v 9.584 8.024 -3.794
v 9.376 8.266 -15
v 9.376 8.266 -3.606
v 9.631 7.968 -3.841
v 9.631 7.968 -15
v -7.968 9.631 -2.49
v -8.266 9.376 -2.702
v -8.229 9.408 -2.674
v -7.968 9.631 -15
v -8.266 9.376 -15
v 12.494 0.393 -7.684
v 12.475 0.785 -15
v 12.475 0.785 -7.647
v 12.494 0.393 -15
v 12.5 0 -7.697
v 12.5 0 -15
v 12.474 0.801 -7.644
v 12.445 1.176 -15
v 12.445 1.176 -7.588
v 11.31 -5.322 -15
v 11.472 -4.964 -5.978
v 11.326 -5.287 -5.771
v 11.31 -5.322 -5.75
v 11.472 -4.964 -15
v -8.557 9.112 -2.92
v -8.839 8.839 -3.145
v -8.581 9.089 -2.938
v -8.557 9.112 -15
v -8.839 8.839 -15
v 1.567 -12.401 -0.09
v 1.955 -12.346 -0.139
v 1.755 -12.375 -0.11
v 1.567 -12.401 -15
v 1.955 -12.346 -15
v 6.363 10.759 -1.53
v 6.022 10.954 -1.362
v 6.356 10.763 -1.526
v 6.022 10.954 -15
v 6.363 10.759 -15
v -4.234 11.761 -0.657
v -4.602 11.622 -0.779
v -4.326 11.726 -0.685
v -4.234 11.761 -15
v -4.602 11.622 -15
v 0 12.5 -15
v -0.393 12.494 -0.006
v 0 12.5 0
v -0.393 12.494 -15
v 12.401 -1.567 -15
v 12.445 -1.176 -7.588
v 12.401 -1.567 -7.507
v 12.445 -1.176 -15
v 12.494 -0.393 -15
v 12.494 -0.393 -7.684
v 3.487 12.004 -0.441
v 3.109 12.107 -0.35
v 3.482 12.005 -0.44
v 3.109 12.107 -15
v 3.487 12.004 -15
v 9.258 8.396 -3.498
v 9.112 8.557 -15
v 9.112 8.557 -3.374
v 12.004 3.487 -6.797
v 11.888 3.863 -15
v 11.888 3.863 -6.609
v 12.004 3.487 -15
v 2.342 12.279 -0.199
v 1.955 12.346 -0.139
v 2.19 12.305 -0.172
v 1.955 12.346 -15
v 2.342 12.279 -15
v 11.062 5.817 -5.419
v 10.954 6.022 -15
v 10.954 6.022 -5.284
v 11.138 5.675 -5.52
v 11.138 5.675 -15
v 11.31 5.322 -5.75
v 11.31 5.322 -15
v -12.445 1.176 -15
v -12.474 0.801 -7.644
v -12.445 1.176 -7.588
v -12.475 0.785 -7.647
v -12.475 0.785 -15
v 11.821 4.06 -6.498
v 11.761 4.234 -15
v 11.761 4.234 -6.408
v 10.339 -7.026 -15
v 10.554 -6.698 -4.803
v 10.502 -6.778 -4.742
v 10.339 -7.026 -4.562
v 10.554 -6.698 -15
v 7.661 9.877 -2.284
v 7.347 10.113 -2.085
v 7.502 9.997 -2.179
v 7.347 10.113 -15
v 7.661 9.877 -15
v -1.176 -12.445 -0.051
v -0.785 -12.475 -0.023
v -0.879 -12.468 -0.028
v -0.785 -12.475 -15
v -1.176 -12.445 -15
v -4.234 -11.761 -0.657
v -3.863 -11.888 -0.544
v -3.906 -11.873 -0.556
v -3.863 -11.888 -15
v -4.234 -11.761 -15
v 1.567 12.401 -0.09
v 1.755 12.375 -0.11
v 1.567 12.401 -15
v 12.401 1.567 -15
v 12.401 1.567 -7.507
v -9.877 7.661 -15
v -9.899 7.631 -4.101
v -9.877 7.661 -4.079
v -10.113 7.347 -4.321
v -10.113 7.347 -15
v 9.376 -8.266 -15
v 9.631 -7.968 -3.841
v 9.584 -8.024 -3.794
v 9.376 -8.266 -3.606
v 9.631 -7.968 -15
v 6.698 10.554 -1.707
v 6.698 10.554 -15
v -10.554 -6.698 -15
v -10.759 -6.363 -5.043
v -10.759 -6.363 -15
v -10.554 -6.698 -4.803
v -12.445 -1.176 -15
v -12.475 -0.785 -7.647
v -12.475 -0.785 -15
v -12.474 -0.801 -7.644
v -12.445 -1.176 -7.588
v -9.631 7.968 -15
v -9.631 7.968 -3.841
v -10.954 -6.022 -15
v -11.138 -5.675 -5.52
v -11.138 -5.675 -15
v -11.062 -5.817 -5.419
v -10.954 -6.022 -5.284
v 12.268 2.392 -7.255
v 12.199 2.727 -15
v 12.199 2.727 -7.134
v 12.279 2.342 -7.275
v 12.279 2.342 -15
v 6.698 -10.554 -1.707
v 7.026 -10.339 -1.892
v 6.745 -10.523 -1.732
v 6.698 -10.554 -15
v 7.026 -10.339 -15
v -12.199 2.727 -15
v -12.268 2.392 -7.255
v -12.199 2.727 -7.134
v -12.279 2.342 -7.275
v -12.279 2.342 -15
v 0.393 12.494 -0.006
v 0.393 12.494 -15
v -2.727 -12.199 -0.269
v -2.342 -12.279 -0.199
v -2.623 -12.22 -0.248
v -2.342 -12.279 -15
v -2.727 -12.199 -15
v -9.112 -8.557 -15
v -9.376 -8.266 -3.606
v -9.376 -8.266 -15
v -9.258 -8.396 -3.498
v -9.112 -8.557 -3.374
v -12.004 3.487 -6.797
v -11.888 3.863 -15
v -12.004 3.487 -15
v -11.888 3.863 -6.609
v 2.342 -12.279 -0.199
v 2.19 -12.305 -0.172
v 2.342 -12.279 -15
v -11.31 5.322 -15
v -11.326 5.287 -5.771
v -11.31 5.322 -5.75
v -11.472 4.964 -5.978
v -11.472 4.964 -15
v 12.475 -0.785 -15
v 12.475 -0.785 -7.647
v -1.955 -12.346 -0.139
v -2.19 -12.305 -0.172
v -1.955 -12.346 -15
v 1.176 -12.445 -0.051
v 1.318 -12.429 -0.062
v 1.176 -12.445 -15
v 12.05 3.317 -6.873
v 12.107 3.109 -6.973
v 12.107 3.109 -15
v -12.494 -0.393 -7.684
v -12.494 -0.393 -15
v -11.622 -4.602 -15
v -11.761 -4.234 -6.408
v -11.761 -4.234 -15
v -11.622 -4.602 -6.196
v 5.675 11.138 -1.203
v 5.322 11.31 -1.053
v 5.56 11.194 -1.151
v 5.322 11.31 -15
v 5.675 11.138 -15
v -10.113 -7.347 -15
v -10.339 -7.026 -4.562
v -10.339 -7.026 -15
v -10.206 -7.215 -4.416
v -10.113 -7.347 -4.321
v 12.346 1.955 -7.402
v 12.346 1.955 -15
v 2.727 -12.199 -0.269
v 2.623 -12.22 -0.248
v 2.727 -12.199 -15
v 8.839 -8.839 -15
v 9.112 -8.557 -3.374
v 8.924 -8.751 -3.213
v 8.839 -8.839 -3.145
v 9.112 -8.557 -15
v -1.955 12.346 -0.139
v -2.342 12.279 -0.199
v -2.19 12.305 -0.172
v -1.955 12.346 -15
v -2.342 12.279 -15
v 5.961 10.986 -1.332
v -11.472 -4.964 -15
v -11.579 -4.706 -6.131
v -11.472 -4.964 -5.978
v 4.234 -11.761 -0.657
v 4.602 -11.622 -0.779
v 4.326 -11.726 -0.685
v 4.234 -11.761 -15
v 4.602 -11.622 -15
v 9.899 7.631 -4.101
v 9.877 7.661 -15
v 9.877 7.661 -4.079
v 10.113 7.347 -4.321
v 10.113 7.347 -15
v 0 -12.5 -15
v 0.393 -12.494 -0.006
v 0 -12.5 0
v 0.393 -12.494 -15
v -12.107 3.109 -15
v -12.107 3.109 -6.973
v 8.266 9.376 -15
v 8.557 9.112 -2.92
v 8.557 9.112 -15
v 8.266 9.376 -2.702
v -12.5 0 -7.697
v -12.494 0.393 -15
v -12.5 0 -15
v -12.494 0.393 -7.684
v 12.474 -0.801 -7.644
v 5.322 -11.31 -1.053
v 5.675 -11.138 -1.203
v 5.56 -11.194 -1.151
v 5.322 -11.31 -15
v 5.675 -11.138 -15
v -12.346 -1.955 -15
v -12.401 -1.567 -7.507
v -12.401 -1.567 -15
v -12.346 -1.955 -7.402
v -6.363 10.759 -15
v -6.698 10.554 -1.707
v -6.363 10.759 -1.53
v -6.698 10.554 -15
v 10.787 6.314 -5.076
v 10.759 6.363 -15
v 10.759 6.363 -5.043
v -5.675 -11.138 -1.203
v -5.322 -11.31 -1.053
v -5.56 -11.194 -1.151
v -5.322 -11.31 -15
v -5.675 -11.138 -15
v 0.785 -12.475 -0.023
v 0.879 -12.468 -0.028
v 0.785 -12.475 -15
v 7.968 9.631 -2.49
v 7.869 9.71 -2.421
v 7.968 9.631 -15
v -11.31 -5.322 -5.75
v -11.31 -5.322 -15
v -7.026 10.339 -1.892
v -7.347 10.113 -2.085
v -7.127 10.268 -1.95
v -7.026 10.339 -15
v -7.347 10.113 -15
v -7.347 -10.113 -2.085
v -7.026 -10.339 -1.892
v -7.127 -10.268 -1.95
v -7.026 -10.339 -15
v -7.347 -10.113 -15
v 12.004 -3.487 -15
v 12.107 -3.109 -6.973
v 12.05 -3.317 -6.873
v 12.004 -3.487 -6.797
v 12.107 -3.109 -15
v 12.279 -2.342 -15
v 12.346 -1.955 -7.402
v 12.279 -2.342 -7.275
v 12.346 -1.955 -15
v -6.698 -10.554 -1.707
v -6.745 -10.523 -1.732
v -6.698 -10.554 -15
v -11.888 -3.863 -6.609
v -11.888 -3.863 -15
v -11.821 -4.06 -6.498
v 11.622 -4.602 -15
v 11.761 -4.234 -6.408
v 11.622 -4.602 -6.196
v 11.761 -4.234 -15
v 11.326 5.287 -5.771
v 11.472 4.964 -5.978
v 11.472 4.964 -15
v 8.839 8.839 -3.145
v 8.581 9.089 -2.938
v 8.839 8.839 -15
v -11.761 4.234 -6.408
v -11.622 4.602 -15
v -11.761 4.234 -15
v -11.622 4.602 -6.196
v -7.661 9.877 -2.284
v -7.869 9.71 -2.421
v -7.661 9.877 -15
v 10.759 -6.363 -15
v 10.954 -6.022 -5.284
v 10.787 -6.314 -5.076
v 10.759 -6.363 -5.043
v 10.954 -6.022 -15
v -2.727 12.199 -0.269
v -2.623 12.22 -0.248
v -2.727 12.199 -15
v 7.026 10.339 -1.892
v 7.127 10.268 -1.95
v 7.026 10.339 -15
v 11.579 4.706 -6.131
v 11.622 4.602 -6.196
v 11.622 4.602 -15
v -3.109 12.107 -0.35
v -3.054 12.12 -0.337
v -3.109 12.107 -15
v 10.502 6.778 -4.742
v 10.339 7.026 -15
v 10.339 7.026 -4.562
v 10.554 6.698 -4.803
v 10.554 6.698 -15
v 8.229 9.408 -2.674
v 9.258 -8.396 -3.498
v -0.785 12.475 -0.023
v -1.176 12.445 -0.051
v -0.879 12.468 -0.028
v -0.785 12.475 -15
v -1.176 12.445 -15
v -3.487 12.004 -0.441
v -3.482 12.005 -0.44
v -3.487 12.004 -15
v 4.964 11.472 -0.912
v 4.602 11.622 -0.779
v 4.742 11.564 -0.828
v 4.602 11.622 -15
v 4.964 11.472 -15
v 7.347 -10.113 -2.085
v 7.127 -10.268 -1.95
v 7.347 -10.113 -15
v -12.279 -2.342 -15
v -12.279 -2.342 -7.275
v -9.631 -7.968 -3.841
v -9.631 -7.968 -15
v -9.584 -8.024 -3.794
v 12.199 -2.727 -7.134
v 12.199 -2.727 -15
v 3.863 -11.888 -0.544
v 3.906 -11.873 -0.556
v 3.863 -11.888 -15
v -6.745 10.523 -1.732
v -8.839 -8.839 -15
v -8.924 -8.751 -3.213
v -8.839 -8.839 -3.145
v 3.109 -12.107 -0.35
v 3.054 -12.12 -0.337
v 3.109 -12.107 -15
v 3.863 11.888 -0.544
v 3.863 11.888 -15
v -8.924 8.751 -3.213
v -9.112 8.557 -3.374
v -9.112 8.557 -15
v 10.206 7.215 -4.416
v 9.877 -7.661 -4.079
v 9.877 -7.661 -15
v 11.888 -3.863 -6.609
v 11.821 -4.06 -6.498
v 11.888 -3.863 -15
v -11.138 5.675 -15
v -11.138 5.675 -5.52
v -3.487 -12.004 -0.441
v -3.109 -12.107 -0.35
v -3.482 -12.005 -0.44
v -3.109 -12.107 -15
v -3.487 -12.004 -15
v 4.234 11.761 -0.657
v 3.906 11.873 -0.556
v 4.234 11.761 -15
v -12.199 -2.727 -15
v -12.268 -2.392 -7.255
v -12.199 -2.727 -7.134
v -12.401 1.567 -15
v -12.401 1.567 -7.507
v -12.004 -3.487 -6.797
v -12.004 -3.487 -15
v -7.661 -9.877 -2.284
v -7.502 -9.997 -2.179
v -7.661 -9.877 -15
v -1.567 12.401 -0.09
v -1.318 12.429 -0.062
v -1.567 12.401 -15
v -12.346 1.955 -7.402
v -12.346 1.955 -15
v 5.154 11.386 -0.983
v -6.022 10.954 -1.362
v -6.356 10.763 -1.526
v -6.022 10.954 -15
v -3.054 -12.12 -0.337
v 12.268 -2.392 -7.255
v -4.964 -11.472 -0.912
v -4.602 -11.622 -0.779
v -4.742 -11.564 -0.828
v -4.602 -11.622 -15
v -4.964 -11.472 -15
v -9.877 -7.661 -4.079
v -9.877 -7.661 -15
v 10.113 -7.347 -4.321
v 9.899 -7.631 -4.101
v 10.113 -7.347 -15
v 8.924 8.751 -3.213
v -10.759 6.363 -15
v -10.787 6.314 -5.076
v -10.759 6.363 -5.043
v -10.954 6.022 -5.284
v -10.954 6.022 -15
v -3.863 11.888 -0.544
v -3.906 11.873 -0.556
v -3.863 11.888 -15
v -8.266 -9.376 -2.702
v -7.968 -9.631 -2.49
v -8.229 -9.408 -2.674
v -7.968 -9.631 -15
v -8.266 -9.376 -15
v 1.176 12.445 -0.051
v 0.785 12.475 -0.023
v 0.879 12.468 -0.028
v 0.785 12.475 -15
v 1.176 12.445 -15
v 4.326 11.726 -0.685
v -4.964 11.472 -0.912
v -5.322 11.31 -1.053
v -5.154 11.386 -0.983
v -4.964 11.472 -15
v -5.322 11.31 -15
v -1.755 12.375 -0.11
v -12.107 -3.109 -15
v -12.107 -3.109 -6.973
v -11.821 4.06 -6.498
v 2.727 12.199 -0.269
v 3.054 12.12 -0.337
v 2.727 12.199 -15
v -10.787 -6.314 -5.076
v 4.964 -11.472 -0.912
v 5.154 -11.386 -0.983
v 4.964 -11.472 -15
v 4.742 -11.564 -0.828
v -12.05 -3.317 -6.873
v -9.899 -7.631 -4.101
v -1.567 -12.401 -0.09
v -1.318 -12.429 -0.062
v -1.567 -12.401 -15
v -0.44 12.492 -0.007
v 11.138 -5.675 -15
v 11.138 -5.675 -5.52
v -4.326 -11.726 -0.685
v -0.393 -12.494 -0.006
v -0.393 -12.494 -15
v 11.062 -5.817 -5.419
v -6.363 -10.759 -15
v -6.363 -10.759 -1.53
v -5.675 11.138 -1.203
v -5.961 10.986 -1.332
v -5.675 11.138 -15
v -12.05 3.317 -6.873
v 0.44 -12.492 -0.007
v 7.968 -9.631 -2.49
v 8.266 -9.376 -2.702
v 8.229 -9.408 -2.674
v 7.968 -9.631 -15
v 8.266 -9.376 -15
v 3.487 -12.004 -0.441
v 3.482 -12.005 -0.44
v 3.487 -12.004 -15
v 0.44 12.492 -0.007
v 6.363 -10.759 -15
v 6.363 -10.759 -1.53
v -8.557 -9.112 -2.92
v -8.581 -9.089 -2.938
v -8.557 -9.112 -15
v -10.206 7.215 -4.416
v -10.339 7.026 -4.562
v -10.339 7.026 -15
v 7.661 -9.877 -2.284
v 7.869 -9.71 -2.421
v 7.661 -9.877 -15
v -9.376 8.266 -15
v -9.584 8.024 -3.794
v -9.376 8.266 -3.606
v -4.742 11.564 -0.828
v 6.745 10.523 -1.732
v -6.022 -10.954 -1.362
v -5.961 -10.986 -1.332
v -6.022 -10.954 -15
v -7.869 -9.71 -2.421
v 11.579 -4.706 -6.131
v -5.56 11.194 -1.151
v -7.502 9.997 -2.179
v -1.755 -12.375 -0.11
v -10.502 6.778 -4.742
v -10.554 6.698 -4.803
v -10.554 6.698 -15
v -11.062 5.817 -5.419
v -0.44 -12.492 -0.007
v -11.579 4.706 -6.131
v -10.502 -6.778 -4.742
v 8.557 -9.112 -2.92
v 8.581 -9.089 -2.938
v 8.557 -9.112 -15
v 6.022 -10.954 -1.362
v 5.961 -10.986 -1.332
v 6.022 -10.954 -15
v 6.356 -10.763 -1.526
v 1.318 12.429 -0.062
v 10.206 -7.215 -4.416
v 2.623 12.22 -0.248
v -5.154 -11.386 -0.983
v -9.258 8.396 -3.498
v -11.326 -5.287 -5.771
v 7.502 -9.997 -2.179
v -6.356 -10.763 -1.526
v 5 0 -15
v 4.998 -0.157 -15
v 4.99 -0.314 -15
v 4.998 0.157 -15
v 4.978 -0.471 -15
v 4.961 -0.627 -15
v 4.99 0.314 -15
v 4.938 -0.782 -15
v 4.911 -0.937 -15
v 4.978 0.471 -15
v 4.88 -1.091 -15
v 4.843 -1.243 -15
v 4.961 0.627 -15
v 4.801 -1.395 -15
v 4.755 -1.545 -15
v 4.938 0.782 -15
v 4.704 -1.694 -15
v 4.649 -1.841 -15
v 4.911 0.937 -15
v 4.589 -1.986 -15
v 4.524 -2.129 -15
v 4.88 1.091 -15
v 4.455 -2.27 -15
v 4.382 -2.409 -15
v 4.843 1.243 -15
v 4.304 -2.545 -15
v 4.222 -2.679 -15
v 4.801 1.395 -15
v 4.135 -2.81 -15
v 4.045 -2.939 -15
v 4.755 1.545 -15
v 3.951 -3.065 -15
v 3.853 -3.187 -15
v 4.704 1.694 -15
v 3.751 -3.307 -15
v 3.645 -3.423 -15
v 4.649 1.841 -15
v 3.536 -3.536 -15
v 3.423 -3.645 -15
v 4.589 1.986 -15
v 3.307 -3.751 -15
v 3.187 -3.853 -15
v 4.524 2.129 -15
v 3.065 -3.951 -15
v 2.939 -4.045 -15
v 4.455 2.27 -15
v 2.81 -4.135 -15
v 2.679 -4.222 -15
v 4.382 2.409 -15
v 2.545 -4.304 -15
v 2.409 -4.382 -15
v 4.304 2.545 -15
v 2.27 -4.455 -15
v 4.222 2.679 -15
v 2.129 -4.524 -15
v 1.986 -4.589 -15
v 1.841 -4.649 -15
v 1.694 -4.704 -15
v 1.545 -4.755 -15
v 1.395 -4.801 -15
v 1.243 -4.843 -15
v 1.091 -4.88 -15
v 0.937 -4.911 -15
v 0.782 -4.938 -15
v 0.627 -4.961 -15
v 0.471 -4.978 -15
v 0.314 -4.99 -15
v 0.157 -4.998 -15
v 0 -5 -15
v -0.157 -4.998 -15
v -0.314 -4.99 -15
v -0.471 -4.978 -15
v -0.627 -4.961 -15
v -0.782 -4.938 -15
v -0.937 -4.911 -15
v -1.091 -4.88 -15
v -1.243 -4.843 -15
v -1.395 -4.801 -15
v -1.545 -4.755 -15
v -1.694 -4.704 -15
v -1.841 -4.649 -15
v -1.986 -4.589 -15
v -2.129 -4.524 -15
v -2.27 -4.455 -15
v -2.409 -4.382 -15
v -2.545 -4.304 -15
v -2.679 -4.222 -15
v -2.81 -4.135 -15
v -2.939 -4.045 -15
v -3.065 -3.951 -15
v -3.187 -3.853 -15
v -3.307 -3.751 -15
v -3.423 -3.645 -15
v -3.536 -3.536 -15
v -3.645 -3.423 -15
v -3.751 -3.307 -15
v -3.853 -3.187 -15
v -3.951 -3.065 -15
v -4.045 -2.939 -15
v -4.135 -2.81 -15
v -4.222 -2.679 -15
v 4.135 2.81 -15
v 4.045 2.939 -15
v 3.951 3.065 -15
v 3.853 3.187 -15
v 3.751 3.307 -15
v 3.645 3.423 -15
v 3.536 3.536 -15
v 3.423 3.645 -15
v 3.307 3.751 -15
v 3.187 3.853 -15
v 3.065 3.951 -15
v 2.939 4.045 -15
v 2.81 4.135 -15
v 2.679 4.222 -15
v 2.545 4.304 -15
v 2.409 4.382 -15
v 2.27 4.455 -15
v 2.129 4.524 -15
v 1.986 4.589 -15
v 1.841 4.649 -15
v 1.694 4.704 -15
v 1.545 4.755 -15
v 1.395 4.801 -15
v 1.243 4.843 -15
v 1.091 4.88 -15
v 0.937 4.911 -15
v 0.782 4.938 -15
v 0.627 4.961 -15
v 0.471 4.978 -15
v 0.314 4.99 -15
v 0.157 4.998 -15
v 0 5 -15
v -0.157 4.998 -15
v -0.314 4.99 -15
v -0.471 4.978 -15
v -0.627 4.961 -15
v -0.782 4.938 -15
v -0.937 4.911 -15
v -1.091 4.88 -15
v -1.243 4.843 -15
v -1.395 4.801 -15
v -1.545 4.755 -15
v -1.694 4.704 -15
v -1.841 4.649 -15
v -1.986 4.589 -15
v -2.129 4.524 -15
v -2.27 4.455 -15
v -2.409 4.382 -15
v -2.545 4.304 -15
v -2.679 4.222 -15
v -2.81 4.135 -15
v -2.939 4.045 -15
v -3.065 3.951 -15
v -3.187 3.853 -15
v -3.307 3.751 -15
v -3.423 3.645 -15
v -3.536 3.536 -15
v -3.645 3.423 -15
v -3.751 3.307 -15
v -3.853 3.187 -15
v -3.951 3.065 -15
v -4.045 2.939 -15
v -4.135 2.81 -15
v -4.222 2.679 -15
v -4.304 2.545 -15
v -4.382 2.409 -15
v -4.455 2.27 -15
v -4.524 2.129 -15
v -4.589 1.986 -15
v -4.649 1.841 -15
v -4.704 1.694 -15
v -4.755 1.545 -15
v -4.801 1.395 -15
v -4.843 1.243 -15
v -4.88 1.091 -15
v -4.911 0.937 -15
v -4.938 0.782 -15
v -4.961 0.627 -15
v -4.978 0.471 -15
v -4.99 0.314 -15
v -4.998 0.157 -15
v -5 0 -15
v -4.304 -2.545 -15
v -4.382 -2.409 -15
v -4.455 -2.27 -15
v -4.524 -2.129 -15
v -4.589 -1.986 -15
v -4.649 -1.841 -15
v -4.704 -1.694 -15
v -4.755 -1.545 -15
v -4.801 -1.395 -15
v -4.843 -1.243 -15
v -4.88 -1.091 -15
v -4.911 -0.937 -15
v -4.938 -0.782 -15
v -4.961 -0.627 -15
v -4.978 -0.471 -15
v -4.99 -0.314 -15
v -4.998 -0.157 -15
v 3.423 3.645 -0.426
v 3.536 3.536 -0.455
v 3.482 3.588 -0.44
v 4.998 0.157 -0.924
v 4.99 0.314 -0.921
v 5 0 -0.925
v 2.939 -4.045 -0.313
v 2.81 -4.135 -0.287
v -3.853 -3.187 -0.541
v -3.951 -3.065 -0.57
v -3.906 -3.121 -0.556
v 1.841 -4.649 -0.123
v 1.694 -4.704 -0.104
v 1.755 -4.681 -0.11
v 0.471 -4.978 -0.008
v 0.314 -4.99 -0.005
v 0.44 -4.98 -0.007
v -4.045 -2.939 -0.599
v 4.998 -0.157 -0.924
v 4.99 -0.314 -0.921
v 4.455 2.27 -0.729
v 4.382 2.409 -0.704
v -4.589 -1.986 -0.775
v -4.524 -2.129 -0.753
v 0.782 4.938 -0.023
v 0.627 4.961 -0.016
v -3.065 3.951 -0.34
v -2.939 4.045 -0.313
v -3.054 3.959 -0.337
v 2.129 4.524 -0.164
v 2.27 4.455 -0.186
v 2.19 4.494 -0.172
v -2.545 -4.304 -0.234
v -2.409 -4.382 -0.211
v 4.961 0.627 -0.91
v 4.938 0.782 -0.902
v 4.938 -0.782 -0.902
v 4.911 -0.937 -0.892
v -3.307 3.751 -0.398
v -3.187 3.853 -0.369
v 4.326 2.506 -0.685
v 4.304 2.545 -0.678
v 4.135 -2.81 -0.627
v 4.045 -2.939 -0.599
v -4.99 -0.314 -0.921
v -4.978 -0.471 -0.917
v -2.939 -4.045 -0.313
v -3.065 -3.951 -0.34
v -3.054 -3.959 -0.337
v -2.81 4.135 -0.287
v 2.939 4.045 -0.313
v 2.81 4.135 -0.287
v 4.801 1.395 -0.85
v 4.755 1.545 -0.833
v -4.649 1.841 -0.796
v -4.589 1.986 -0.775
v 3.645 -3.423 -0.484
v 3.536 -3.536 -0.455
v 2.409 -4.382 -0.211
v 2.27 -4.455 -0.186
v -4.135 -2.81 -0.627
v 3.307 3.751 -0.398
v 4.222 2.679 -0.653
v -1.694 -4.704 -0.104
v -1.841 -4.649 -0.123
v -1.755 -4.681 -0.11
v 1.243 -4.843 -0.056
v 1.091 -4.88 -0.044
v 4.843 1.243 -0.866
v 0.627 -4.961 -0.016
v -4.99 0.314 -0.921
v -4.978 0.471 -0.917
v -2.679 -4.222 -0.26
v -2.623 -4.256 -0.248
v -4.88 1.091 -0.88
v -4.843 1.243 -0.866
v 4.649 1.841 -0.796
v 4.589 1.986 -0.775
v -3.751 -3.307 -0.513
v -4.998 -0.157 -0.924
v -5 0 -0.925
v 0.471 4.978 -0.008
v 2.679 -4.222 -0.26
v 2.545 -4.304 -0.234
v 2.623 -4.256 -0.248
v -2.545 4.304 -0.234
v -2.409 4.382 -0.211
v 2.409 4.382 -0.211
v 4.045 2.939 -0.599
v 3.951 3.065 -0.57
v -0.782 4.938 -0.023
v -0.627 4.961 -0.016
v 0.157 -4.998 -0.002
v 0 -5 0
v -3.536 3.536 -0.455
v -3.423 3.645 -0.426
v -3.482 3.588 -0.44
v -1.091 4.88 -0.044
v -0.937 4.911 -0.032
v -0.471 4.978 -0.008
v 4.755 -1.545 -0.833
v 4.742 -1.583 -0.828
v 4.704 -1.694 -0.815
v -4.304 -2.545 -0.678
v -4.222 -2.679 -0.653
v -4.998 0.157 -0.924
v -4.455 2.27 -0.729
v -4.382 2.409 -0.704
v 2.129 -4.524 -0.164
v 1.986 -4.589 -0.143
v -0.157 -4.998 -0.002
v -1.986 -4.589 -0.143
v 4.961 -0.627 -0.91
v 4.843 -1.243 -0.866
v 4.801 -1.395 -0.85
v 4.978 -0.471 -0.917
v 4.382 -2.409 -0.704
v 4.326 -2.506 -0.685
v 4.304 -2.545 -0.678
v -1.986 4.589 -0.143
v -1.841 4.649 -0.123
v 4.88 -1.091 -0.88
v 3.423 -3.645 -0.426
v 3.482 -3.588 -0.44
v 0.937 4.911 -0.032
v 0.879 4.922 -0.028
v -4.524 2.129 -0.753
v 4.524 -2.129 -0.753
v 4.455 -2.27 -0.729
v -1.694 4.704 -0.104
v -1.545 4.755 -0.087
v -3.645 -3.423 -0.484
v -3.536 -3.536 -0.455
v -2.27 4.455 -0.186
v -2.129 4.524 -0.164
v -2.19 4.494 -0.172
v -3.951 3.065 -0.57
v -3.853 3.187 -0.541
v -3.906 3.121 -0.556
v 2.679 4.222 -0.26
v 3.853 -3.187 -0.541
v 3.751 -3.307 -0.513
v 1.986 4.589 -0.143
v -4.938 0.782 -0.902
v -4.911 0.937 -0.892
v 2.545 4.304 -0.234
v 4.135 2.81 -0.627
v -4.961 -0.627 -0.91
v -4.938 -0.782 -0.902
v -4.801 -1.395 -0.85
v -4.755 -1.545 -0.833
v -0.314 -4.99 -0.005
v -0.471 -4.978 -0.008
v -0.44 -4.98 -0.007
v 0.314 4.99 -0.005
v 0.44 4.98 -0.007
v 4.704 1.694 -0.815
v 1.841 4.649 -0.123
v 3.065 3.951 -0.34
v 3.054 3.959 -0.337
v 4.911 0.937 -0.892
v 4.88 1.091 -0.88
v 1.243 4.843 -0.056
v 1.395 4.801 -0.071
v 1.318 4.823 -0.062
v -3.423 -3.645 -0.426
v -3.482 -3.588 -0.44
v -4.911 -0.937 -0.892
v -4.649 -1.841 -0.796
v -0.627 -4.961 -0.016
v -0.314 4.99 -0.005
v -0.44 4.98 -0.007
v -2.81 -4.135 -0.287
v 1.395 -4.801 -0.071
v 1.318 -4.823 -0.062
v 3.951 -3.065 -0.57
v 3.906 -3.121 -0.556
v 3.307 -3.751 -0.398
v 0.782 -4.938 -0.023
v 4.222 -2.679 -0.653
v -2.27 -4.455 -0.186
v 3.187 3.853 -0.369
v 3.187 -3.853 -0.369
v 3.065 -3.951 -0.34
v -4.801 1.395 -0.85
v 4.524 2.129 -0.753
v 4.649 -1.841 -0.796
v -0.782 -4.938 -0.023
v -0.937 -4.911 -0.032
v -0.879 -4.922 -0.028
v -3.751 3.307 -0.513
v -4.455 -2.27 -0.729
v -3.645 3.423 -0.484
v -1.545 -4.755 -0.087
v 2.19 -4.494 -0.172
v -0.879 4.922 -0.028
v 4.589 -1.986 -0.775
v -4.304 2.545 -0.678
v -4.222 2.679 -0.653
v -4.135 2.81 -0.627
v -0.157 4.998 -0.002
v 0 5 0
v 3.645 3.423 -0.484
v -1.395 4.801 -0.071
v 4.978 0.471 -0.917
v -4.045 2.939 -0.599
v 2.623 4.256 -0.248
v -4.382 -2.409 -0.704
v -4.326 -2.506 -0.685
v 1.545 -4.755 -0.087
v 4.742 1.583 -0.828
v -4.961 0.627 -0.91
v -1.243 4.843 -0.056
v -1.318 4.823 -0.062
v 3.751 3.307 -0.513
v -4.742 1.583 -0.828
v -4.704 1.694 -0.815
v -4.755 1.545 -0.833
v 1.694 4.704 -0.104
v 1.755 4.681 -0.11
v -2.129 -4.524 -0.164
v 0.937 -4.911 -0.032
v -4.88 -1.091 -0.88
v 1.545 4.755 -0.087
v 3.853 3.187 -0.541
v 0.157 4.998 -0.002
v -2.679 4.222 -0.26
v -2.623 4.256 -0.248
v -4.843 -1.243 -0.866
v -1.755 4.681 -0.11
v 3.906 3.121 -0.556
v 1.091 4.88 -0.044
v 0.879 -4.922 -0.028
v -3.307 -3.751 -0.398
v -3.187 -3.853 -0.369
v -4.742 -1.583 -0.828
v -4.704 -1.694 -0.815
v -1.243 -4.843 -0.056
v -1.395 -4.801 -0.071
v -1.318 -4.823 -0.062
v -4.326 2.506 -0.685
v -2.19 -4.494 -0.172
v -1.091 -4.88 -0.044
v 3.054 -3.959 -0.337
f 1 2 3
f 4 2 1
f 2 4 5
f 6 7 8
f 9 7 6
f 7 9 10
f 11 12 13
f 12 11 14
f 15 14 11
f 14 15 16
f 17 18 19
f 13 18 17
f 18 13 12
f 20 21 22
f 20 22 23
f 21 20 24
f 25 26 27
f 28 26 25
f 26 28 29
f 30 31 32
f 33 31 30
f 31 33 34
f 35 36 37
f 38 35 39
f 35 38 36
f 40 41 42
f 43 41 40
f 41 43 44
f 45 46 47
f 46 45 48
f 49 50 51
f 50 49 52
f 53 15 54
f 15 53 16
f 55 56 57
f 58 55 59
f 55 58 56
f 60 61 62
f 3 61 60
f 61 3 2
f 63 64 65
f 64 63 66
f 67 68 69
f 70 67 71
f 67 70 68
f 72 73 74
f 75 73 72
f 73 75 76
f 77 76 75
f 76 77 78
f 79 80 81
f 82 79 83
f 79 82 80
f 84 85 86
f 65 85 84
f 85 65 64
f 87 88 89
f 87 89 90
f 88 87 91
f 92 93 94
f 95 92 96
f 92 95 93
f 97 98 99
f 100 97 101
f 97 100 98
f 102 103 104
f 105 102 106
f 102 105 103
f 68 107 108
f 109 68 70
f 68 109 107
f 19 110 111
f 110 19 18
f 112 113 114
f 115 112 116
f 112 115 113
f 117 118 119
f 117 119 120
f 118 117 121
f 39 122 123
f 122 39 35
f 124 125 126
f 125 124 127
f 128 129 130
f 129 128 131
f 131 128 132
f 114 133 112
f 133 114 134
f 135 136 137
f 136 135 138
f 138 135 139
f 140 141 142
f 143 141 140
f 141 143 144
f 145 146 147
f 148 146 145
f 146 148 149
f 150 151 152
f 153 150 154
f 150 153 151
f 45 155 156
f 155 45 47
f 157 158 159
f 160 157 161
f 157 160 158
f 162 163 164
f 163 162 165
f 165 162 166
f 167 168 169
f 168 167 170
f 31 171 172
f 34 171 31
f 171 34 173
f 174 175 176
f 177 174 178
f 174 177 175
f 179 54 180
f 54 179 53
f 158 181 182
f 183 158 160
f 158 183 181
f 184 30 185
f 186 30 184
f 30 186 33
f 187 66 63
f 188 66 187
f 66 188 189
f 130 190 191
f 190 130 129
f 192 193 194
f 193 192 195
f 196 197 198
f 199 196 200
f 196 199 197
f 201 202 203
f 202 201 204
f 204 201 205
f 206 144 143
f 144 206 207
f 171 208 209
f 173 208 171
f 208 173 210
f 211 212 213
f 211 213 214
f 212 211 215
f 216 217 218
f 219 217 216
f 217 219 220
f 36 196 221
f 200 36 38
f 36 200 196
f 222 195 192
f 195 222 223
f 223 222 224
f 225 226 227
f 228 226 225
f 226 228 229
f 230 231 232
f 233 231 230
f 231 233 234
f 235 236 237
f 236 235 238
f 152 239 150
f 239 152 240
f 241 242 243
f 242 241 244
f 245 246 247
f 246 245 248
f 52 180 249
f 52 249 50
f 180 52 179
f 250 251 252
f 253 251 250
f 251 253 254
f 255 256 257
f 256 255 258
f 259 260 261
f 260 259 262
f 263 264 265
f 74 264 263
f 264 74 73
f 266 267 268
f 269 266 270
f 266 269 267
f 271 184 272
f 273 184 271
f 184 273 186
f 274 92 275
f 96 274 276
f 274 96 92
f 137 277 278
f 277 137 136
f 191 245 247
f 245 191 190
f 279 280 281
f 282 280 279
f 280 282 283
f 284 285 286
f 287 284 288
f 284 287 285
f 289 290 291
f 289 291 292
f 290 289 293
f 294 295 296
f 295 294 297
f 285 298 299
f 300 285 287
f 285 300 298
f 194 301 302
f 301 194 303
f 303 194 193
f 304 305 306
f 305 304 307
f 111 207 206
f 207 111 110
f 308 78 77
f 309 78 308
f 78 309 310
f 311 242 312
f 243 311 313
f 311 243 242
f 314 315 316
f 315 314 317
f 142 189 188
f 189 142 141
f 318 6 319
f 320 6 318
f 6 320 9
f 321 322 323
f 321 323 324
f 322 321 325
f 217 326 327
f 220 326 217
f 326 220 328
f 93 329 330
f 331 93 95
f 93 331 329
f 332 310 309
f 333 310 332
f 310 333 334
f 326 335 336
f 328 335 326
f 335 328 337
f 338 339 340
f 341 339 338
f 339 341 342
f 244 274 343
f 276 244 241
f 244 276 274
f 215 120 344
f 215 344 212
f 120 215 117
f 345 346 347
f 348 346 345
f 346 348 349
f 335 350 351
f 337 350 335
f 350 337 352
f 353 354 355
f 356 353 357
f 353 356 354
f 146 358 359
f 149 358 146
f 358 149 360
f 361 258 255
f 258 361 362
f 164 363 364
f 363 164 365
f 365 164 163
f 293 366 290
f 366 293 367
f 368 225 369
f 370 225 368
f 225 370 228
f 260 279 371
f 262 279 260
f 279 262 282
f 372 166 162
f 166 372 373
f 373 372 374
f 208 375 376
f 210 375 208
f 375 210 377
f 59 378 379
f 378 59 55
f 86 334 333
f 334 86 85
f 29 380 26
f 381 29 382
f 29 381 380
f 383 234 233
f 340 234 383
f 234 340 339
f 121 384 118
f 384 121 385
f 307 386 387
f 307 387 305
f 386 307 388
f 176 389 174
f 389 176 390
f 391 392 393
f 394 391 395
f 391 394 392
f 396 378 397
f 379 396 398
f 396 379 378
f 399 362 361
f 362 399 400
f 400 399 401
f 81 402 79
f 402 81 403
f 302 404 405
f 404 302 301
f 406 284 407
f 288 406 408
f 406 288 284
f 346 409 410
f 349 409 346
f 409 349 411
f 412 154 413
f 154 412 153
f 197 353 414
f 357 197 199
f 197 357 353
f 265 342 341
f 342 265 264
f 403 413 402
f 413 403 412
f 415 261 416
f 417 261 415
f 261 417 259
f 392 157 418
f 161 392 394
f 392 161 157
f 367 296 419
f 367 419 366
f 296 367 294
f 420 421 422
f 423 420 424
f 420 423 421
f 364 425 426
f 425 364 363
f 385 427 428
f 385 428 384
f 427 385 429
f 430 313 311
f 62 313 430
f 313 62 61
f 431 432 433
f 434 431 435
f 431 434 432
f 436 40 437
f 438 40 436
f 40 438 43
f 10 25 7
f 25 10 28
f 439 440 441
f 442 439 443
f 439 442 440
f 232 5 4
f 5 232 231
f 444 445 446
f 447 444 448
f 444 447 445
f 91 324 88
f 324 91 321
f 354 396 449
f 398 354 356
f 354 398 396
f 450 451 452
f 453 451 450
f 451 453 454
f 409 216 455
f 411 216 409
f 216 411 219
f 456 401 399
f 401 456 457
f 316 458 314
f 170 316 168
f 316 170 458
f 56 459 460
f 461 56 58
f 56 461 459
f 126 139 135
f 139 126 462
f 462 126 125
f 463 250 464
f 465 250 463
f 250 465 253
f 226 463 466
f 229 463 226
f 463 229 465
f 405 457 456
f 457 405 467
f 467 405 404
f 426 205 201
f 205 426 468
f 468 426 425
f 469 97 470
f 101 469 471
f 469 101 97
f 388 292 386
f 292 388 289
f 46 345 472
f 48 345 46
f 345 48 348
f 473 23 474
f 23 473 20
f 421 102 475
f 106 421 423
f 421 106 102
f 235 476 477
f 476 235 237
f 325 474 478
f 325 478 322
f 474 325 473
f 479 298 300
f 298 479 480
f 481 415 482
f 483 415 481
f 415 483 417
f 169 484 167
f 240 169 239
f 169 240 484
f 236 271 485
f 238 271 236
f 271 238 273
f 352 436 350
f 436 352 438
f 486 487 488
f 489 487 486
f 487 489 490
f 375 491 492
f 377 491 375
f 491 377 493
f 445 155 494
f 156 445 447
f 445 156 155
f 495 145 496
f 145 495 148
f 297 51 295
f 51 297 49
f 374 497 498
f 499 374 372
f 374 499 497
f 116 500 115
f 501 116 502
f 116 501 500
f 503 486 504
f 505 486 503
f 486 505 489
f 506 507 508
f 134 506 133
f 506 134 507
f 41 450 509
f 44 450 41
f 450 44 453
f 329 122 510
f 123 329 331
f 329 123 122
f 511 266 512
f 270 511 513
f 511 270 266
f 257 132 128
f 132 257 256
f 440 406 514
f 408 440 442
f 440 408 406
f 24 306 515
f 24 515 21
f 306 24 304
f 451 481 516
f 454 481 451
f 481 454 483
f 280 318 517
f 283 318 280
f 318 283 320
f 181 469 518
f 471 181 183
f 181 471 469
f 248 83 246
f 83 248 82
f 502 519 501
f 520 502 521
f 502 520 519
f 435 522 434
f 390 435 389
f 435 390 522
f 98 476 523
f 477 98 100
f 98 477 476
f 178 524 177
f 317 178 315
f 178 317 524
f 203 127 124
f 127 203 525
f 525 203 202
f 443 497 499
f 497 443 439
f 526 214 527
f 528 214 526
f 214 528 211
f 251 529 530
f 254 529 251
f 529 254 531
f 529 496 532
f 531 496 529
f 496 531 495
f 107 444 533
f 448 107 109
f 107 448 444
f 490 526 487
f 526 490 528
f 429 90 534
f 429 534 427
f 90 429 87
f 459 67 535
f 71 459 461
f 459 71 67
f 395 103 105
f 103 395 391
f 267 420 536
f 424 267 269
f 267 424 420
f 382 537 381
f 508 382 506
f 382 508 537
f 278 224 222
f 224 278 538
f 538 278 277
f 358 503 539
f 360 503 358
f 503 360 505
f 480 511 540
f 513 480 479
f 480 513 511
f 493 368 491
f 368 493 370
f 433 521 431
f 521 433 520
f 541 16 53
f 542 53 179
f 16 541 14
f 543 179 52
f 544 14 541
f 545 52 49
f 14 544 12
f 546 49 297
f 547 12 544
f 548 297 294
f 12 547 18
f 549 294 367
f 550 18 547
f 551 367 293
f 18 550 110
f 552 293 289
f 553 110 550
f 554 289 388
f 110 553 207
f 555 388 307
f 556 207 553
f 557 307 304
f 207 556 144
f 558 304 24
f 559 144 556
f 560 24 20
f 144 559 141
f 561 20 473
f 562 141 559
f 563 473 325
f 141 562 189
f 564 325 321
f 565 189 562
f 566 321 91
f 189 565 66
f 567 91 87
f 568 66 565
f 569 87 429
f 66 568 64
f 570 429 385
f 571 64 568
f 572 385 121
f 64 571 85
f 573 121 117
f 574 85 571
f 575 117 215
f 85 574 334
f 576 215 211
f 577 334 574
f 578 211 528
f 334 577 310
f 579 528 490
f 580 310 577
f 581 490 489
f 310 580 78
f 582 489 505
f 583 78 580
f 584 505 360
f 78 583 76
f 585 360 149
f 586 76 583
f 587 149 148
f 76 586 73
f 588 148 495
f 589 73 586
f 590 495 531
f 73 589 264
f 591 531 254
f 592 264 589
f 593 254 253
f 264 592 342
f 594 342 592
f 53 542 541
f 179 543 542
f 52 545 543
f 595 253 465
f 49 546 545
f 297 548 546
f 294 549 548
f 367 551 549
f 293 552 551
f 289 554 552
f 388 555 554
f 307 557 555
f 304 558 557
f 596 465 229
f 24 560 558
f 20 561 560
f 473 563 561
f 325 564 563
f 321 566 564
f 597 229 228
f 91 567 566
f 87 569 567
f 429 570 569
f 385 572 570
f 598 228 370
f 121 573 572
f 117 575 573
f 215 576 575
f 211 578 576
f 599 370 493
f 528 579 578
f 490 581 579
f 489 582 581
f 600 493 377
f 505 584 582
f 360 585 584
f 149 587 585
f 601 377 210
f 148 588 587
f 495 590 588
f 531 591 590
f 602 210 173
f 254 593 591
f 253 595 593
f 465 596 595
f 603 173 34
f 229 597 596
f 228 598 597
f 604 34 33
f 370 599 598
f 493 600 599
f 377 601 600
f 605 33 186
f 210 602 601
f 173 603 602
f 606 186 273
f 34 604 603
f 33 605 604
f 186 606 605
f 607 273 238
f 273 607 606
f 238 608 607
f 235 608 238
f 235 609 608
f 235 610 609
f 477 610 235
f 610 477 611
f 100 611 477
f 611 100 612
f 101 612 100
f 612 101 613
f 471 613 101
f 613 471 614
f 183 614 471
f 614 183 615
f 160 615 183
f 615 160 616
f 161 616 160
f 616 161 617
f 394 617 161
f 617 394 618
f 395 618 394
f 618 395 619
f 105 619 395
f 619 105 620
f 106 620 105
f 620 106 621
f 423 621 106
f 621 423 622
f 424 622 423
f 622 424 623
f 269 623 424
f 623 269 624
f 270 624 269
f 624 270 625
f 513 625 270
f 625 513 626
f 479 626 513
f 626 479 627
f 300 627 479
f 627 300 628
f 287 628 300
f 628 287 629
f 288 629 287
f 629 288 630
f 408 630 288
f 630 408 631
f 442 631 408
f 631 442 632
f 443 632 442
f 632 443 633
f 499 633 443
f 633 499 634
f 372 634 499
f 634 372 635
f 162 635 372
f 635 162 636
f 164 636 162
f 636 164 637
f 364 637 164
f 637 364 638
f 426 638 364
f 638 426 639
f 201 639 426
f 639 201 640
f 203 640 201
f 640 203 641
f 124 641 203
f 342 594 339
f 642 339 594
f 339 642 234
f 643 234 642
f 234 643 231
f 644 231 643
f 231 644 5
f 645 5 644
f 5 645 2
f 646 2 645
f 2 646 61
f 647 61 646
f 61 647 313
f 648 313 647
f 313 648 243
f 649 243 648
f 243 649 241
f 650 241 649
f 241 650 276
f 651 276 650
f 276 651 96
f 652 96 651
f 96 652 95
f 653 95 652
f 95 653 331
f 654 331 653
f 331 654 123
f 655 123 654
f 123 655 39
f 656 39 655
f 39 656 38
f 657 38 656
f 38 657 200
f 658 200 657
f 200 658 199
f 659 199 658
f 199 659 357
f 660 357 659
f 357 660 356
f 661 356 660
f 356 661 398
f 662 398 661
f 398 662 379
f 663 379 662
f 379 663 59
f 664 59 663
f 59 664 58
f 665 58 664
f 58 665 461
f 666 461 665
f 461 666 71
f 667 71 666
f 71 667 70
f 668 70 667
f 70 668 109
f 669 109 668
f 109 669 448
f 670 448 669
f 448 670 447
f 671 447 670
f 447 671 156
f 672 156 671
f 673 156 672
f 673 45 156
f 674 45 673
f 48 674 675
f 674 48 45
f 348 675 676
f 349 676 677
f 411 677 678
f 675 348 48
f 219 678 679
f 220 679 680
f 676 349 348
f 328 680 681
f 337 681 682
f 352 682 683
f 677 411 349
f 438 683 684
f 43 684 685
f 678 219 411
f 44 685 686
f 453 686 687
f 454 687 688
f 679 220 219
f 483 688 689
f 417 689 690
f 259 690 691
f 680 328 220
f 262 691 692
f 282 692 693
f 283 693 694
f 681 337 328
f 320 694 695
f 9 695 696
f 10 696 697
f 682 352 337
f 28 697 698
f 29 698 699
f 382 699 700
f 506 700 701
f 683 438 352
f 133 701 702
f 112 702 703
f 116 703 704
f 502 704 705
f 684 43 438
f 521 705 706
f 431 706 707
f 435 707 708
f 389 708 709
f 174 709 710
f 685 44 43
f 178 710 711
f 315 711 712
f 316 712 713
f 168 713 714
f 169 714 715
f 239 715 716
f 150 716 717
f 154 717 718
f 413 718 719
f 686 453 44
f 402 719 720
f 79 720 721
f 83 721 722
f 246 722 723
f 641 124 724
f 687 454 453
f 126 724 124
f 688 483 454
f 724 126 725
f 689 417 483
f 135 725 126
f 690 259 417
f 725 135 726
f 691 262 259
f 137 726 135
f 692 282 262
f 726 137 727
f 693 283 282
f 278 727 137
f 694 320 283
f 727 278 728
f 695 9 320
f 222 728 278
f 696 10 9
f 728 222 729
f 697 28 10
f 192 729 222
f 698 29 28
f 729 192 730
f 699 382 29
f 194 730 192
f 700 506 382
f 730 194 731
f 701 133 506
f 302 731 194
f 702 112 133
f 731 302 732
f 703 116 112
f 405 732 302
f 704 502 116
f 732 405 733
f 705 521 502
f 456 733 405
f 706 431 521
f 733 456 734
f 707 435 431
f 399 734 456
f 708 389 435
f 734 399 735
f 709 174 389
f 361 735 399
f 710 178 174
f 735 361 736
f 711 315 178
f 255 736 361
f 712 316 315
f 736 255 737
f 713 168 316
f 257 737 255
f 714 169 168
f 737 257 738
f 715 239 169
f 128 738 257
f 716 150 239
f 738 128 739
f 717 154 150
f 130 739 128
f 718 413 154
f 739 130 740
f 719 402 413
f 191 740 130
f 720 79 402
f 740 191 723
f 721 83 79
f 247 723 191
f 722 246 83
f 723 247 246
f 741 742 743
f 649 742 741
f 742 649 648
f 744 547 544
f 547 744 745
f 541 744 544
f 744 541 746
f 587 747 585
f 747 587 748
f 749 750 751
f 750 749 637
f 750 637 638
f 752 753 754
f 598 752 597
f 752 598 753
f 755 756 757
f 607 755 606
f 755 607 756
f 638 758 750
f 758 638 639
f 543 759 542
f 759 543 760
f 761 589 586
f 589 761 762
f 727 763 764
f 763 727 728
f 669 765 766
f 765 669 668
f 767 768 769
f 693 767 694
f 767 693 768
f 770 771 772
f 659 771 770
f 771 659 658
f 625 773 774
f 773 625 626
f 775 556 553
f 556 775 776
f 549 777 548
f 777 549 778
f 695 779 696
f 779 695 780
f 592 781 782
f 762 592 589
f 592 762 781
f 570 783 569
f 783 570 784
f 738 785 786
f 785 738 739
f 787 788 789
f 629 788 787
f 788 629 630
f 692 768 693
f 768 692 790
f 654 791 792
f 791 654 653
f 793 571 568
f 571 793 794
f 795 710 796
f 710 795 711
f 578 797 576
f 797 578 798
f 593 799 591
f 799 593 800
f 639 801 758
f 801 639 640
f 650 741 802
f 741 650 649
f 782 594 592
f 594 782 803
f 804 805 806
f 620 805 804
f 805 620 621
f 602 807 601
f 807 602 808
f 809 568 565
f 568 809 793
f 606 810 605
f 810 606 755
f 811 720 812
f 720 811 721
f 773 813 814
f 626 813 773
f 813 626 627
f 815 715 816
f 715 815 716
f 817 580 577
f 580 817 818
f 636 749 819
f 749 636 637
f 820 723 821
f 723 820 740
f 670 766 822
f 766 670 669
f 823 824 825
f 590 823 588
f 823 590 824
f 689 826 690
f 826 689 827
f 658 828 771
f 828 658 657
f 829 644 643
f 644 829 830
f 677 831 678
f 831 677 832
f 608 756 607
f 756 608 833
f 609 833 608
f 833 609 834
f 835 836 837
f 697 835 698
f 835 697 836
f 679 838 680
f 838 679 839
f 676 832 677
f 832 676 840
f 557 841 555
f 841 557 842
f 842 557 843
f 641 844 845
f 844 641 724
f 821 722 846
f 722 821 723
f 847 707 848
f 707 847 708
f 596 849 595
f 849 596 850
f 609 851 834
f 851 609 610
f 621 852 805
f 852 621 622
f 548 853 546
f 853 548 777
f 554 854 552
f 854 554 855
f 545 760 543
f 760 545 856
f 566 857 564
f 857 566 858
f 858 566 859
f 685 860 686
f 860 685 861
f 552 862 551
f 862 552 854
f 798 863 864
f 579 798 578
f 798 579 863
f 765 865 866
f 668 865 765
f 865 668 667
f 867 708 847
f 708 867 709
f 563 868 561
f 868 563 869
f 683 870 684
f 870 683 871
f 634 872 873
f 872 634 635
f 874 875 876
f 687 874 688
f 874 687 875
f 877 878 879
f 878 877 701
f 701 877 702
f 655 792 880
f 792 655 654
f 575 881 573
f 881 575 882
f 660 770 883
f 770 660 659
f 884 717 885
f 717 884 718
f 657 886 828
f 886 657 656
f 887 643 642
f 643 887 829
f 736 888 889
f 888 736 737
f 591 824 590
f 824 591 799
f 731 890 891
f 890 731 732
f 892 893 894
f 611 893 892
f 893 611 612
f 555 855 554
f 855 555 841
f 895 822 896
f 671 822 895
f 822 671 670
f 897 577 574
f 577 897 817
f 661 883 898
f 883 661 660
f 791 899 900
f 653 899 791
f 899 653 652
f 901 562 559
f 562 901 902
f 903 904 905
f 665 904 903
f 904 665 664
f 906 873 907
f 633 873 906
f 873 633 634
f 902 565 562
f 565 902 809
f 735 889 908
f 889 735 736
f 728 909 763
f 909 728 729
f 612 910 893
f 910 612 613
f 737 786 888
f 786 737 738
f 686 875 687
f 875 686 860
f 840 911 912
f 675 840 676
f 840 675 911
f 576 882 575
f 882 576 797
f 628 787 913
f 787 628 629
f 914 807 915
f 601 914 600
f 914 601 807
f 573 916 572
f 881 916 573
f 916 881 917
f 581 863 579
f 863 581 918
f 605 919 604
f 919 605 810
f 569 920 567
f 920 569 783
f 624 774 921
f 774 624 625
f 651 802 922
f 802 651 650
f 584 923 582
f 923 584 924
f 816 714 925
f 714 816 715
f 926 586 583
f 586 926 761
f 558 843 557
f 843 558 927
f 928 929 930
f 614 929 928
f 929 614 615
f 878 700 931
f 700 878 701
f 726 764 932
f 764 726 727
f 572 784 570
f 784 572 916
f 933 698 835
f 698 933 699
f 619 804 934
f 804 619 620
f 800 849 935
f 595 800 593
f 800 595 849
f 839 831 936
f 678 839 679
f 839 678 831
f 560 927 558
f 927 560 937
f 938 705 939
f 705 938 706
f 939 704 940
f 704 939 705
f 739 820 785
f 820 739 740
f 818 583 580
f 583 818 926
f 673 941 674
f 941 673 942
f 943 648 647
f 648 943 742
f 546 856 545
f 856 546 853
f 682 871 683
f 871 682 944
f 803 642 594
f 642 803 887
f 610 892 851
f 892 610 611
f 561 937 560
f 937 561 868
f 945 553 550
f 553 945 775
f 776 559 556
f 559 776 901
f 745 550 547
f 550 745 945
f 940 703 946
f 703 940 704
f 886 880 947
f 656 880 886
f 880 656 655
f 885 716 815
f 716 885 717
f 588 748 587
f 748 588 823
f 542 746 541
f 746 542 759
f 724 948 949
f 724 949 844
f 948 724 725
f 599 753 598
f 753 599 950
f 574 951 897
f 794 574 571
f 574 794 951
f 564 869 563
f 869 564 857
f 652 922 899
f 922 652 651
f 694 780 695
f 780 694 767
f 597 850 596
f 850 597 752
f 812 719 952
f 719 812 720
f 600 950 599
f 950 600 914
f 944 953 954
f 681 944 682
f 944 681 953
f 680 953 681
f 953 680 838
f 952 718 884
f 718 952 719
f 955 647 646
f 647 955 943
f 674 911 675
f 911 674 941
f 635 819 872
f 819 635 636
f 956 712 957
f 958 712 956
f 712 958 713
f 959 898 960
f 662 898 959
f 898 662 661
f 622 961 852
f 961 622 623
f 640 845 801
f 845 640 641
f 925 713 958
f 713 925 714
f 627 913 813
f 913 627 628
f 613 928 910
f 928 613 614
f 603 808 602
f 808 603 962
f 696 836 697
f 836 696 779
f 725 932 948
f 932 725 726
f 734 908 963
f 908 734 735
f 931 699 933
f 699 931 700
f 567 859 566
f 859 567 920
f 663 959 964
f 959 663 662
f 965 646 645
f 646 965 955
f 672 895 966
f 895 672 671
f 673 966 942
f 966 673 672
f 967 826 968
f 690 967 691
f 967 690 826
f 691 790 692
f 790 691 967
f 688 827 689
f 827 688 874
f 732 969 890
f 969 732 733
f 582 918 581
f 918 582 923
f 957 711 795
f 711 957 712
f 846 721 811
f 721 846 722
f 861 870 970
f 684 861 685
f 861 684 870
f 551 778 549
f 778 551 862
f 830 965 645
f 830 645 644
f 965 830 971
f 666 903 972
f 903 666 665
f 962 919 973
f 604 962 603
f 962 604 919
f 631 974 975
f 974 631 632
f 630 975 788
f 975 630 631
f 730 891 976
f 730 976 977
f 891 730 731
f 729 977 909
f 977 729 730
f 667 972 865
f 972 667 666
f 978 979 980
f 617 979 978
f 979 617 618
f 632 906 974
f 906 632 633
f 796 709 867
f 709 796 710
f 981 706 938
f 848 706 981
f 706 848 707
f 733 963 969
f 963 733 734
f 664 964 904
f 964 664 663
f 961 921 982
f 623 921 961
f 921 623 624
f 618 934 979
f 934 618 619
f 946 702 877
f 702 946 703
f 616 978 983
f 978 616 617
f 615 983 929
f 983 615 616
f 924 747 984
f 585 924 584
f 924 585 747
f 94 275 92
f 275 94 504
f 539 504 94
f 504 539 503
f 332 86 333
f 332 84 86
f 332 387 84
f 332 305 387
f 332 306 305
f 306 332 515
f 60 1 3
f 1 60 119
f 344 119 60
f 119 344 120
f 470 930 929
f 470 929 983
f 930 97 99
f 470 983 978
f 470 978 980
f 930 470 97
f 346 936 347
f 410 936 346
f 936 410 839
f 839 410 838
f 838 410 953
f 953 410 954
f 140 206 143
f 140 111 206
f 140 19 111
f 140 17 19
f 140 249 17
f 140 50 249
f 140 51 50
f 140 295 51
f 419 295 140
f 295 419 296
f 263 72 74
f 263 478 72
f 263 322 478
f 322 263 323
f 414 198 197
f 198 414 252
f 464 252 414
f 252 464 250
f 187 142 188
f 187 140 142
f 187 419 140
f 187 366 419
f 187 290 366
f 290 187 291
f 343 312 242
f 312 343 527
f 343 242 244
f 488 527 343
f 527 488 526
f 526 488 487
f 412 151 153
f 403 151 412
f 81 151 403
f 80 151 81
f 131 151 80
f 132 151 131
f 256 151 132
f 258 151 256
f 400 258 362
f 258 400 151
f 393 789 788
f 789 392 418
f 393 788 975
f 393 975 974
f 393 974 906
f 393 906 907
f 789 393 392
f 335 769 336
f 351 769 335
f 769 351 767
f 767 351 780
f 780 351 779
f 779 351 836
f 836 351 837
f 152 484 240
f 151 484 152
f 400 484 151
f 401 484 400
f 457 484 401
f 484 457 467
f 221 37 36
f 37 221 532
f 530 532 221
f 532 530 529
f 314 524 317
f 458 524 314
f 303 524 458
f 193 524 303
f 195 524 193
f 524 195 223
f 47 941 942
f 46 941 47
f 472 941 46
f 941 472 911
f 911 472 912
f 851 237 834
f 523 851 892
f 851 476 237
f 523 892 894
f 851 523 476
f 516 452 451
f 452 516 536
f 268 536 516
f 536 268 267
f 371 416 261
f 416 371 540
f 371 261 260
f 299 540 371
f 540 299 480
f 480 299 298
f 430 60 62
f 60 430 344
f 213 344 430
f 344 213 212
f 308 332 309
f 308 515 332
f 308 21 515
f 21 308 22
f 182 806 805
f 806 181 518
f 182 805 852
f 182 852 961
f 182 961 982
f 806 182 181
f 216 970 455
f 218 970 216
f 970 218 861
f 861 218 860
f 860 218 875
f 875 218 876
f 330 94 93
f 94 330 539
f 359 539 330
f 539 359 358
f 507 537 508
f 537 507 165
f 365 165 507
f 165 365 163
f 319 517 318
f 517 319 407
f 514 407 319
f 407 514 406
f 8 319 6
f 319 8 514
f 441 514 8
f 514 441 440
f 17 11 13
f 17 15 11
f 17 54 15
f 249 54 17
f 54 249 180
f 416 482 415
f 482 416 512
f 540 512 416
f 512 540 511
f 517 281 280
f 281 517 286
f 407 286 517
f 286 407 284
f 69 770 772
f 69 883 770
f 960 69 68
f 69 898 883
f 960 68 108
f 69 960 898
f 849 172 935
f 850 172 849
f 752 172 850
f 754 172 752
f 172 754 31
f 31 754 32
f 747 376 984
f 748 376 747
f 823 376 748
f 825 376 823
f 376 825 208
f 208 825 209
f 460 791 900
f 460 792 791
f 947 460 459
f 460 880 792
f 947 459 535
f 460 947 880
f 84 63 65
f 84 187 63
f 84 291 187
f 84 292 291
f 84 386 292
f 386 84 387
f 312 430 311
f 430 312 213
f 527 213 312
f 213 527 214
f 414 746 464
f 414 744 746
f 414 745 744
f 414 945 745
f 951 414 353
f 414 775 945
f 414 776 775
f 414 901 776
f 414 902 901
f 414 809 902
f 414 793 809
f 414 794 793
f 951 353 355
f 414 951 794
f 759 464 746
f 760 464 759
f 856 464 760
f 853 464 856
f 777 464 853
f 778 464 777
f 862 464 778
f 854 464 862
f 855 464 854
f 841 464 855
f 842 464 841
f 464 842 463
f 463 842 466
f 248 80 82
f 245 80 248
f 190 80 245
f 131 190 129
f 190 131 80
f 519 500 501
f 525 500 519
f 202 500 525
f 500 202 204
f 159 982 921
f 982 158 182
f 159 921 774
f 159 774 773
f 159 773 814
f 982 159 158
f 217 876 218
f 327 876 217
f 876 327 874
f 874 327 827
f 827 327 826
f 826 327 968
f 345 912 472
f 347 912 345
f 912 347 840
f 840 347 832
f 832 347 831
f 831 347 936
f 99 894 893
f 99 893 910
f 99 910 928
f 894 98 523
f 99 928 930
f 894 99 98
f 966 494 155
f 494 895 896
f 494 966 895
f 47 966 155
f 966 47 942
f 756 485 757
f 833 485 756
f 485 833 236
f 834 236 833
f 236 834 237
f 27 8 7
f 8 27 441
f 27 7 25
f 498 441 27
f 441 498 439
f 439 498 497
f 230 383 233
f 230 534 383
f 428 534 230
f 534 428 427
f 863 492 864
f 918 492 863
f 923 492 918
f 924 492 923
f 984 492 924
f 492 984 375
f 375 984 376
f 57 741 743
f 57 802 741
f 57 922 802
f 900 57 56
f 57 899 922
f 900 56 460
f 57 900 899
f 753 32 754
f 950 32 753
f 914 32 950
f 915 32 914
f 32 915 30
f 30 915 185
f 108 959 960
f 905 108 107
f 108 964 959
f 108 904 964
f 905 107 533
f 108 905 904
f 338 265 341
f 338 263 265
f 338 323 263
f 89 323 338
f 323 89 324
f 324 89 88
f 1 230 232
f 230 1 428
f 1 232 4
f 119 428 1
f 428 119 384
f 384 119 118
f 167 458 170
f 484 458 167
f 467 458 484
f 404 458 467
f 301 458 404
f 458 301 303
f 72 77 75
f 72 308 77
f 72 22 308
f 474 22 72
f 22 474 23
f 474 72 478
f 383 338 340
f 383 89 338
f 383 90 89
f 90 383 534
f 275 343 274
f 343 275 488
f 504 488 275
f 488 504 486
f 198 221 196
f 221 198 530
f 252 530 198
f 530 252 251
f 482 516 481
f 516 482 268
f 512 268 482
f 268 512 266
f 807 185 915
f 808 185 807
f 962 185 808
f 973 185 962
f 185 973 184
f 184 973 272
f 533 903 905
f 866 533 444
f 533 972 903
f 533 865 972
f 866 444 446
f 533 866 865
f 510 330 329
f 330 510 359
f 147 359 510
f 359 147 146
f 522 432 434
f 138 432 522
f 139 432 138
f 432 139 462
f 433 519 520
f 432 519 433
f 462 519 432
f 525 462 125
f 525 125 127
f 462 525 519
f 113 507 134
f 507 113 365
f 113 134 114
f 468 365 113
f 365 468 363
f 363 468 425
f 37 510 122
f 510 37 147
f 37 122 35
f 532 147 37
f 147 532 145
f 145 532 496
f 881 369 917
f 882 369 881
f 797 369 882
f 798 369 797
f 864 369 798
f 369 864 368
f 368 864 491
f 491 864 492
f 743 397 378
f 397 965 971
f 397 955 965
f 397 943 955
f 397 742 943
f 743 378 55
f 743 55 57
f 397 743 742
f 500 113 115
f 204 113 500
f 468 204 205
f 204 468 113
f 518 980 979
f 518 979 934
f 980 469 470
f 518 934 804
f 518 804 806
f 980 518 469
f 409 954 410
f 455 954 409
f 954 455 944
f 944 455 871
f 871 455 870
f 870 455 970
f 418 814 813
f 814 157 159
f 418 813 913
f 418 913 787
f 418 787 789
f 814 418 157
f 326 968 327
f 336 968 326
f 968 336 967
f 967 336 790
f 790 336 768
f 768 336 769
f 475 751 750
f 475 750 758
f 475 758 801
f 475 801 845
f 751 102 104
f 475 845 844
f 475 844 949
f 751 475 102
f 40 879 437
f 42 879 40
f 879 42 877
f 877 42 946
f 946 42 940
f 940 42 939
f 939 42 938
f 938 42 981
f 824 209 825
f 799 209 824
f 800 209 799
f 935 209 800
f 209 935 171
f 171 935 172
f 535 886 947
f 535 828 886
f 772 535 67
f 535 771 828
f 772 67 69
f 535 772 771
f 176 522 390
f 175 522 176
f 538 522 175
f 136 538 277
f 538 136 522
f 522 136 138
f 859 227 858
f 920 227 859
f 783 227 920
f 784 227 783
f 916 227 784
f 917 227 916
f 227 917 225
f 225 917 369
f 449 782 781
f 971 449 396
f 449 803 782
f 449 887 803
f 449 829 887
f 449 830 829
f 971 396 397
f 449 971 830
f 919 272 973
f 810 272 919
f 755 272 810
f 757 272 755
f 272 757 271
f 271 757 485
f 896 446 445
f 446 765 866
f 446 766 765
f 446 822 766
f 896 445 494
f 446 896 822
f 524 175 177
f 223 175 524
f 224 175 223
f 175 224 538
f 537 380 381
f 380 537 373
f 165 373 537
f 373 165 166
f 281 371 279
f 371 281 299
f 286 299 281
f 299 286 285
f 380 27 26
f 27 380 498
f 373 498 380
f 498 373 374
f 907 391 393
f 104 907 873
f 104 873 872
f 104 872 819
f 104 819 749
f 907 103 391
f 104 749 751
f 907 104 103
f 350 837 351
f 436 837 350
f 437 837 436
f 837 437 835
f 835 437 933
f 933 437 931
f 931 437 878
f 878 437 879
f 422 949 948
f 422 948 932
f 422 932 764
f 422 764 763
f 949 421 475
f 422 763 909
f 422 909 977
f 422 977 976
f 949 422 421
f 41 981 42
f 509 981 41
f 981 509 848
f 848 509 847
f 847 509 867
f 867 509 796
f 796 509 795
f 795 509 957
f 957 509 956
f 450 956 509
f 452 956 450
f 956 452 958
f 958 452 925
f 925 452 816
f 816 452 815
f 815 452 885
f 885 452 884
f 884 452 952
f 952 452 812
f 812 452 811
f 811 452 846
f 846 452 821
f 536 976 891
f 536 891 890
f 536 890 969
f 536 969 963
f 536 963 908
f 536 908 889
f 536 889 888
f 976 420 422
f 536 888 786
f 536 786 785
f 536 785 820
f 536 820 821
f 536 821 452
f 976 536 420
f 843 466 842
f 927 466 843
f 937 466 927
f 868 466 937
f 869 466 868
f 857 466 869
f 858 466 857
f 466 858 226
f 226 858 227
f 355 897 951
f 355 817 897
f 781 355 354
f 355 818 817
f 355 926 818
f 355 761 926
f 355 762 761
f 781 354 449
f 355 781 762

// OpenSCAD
$fn=200;

translate([0,0,-15]) intersection() {
    difference() {
        cylinder(15,12.5,12.5);
        translate([0,0,-2]) cylinder(20,5,5);
    }
    translate([0,20,1]) rotate([90,0,0]) cylinder(40,14,14);
}
